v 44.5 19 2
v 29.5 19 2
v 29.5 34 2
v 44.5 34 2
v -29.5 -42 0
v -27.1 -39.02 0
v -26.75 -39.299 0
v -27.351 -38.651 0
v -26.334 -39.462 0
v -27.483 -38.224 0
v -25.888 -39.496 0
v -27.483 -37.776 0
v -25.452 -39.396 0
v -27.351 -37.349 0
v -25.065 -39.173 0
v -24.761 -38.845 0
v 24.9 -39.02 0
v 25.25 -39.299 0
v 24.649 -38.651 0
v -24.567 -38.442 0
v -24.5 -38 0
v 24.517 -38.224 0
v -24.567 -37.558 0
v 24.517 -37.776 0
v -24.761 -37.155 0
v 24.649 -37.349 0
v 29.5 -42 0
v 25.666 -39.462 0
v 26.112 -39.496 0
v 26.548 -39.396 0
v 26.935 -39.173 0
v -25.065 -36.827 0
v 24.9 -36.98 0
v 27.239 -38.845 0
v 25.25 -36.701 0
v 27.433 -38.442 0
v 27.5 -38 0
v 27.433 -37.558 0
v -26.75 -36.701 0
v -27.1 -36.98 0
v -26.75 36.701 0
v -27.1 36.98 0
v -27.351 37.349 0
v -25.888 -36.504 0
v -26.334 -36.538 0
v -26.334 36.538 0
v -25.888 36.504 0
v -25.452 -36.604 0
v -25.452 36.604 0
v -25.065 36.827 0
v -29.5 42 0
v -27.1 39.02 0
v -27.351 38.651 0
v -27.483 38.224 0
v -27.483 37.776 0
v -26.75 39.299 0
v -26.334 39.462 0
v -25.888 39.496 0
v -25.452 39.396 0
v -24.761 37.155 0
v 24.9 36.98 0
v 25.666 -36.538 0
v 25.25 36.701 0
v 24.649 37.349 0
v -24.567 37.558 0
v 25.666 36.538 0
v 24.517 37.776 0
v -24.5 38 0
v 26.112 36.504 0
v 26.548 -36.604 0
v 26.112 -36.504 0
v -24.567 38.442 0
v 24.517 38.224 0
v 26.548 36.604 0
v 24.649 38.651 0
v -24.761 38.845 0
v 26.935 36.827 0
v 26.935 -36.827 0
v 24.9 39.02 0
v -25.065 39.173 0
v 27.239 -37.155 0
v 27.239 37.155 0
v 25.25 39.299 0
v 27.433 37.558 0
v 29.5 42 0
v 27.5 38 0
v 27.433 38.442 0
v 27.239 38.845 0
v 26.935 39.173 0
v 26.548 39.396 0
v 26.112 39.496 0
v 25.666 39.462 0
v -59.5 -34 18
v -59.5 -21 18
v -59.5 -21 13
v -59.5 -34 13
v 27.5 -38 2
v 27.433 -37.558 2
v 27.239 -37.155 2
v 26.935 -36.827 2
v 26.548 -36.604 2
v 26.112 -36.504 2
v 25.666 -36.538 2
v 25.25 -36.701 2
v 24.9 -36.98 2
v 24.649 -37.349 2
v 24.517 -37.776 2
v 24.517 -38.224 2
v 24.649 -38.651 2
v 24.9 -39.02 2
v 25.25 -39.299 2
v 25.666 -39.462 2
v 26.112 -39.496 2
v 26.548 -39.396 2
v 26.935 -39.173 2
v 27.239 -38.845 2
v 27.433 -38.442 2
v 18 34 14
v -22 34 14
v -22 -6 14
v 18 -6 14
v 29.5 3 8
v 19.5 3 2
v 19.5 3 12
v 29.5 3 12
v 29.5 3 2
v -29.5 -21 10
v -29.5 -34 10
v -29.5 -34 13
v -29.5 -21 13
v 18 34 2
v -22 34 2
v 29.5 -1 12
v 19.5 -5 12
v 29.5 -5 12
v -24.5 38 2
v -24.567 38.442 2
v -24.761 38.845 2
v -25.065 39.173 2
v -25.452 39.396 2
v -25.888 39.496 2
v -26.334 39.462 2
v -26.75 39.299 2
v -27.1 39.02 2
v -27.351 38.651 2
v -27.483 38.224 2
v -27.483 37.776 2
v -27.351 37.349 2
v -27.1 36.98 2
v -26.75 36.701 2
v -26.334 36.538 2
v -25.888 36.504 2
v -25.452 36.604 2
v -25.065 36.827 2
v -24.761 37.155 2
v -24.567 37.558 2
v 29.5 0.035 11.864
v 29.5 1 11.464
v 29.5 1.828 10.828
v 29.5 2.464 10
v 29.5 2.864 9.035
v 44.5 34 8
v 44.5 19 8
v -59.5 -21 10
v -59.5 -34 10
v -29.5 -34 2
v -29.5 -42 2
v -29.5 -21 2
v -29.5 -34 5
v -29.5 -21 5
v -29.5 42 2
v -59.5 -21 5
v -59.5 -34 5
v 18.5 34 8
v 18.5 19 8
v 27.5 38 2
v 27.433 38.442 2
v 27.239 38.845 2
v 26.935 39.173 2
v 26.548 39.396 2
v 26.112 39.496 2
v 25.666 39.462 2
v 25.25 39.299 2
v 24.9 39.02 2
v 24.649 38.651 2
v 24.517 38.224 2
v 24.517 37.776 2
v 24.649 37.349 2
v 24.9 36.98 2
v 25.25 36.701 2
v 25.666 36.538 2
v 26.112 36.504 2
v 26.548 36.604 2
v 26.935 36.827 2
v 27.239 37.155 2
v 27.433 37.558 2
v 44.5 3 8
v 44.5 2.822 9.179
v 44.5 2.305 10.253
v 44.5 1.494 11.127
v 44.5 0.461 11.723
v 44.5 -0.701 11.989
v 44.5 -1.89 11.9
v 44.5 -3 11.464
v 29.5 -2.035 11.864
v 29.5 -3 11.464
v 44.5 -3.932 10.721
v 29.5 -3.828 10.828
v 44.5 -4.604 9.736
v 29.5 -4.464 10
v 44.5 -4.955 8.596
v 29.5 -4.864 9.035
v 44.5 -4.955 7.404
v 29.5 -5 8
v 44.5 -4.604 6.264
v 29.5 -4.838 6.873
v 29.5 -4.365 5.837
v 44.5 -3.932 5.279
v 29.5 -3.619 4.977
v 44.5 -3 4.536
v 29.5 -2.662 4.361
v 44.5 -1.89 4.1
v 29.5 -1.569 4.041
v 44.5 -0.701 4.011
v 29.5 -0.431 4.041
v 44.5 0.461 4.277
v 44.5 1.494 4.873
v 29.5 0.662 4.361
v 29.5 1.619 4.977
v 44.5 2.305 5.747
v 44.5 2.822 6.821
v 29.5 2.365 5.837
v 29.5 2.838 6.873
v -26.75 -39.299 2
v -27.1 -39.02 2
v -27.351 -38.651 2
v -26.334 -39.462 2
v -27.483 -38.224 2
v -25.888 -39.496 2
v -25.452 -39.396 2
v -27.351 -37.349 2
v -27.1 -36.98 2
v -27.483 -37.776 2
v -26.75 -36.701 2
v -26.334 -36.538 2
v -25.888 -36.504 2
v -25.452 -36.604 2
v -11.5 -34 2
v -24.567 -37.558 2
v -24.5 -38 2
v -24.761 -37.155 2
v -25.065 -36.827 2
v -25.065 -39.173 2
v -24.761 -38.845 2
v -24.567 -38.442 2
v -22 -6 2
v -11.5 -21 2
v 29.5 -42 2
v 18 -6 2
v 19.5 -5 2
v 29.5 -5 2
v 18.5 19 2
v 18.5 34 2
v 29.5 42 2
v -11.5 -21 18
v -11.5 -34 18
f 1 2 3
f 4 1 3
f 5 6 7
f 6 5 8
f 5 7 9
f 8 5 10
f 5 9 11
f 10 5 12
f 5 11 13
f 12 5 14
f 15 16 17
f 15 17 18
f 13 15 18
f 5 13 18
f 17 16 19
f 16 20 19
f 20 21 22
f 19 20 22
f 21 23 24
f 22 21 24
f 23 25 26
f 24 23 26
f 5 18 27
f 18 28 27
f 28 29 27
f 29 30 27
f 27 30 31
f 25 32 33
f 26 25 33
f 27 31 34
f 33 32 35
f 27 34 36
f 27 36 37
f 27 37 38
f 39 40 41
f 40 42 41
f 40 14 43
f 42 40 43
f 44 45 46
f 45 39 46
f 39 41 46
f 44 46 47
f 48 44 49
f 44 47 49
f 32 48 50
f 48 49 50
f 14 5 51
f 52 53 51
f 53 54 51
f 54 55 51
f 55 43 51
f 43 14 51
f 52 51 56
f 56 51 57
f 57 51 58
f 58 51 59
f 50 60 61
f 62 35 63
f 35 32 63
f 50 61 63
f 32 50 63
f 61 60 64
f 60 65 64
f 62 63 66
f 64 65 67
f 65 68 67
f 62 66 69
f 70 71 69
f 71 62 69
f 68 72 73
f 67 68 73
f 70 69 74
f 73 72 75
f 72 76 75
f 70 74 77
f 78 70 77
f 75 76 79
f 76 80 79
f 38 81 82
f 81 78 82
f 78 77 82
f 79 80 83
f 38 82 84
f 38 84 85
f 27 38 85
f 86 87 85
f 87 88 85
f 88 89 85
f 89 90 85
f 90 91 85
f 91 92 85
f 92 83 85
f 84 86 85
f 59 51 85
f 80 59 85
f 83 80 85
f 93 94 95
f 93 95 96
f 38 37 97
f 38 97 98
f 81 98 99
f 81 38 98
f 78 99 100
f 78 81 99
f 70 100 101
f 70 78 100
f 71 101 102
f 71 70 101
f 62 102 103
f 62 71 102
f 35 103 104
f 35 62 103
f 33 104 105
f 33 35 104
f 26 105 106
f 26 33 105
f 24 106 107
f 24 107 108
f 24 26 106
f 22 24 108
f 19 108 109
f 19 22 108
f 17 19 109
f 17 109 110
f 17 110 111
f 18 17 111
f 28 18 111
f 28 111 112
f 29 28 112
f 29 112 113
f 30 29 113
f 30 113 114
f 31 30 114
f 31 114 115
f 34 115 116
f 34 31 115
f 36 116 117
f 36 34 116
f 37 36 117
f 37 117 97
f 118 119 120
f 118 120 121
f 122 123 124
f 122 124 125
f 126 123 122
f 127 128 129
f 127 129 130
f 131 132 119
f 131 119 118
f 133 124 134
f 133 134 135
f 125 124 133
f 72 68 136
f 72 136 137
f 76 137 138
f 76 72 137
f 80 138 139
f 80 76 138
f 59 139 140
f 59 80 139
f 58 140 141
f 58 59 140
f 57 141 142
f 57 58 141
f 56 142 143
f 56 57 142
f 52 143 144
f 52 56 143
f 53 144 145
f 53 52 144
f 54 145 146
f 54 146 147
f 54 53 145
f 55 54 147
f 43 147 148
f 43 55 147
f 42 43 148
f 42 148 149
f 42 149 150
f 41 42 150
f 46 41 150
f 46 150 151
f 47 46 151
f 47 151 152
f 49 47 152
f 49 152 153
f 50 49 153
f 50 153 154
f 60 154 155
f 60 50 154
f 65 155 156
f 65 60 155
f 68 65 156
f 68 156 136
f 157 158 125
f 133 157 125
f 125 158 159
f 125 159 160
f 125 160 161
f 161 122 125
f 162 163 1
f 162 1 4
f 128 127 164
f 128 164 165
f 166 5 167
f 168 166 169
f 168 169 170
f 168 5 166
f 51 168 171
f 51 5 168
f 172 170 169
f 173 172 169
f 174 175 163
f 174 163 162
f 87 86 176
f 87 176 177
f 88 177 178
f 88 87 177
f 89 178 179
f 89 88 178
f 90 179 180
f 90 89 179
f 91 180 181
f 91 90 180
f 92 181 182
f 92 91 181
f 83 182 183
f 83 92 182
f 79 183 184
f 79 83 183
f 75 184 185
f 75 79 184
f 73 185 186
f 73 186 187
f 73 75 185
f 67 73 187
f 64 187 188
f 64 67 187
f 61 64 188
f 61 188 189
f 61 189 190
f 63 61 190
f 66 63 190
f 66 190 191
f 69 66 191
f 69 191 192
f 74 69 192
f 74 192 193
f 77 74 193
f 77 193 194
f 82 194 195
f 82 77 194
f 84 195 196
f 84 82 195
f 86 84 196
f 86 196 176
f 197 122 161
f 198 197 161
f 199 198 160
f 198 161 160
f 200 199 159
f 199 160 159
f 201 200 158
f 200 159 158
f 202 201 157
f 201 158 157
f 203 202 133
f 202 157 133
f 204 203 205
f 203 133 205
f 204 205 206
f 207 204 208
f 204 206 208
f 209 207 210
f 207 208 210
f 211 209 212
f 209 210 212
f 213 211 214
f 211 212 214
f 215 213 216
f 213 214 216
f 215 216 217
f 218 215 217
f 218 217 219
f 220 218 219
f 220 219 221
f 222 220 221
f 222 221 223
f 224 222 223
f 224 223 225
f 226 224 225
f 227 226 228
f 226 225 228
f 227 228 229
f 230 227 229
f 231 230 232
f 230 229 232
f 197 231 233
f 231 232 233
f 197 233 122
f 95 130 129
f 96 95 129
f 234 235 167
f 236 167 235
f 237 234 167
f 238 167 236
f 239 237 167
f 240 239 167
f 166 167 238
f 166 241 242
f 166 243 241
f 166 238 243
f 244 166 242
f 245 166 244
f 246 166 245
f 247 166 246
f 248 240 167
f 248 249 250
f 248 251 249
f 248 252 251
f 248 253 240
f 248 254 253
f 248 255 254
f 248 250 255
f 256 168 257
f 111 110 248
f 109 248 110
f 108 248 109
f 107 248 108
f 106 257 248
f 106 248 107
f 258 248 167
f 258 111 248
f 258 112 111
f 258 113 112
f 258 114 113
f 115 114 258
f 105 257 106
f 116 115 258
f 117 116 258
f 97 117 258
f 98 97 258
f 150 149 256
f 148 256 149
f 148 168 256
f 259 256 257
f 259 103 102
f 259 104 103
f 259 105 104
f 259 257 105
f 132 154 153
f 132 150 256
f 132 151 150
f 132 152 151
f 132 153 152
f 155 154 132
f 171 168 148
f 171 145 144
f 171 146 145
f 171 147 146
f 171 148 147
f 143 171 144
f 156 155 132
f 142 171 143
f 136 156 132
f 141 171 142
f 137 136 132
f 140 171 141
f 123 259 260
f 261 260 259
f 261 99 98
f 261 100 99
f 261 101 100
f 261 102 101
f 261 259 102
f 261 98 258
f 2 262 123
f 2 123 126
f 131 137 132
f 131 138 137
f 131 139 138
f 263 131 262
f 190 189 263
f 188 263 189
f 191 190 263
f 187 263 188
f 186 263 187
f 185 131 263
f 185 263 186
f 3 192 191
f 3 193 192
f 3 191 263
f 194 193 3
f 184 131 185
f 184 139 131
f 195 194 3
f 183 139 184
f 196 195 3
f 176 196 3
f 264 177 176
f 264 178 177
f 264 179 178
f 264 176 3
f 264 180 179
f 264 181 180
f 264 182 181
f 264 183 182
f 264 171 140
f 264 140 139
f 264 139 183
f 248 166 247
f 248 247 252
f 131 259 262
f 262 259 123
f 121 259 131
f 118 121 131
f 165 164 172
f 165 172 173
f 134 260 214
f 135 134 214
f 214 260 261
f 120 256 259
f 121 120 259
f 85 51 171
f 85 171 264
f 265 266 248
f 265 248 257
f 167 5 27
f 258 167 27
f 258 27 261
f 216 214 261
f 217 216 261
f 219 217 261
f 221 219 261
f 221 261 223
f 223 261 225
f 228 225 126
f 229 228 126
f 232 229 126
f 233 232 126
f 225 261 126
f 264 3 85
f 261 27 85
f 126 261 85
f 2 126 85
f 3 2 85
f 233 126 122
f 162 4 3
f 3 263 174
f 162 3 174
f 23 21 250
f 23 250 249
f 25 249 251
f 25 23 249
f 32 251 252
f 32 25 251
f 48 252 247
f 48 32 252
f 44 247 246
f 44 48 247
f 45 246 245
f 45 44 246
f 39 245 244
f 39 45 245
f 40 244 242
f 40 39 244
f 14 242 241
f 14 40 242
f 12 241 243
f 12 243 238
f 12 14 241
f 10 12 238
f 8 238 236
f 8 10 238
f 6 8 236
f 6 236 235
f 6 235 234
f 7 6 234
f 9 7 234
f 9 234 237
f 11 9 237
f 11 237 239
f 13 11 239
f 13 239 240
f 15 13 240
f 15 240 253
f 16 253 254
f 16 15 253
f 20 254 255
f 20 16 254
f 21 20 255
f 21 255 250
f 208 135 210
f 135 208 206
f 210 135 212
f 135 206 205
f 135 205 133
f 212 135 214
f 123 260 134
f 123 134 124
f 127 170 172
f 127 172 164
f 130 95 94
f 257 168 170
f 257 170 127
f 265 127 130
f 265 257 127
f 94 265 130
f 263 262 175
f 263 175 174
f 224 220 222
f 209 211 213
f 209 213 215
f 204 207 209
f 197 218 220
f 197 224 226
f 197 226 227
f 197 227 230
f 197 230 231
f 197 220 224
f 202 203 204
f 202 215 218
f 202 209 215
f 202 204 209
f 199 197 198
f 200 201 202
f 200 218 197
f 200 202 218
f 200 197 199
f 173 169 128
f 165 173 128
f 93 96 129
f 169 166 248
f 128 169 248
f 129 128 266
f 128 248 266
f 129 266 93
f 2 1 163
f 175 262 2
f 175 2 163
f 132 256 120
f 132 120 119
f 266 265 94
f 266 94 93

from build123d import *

# Parameters (mm, degrees)
F0_W      = 59
F0_H      = 84
F0_R      = 1.5
F1_DEPTH  = 2
F2_W      = 40
F2_H      = 40
F3_DEPTH  = 12
F4_W      = 18
F4_H      = 13
F5_DEPTH  = 16
F6_W      = 13
F6_H      = 5
F7_DEPTH  = 30
F8_W      = 10
F8_H      = 8
F9_DEPTH  = 10
F10_R     = 4
F11_DEPTH = 15
F12_W     = 11
F12_H     = 15
F13_DEPTH = 6
F14_W     = 15
F14_H     = 6
F15_DEPTH = 15


with BuildPart() as f1:
    # F0 (on Top) → F1 (new body)
    with BuildSketch(Plane.XY):
        Rectangle(F0_W, F0_H)
        with Locations((-26, -38)):
            Circle(F0_R, mode=Mode.SUBTRACT)
        with Locations((26, -38)):
            Circle(F0_R, mode=Mode.SUBTRACT)
        with Locations((-26, 38)):
            Circle(F0_R, mode=Mode.SUBTRACT)
        with Locations((26, 38)):
            Circle(F0_R, mode=Mode.SUBTRACT)
    extrude(amount=F1_DEPTH)

    # F2 (on face) → F3 (join)
    with BuildSketch(Plane.XY.offset(2)):
        with Locations((-2, 14)):
            Rectangle(F2_W, F2_H)
    extrude(amount=F3_DEPTH)

    # F4 (on face) → F5 (join)
    with BuildSketch(Plane.XY.offset(2)):
        with Locations((-20.5, -27.5)):
            Rectangle(F4_W, F4_H)
    extrude(amount=F5_DEPTH)

    # F6 (on face) → F7 (join)
    with BuildSketch(Plane(origin=(-29.5, 0, 0), x_dir=(0, -1, 0), z_dir=(-1, 0, 0))):
        with Locations((27.5, 15.5)):
            Rectangle(F6_W, F6_H)
        with Locations((27.5, 7.5)):
            Rectangle(F6_W, F6_H)
    extrude(amount=F7_DEPTH)

    # F8 (on face) → F9 (join)
    with BuildSketch(Plane.XY.offset(2)):
        with Locations((24.5, -1)):
            Rectangle(F8_W, F8_H)
    extrude(amount=F9_DEPTH)

    # F10 (on face) → F11 (join)
    with BuildSketch(Plane.YZ.offset(29.5)):
        with Locations((-1, 8)):
            Circle(F10_R)
    extrude(amount=F11_DEPTH)

    # F12 (on face) → F13 (join)
    with BuildSketch(Plane.XY.offset(2)):
        with Locations((24, 26.5)):
            Rectangle(F12_W, F12_H)
    extrude(amount=F13_DEPTH)

    # F14 (on face) → F15 (join)
    with BuildSketch(Plane.YZ.offset(29.5)):
        with Locations((26.5, 5)):
            Rectangle(F14_W, F14_H)
    extrude(amount=F15_DEPTH)


solid = f1.part
